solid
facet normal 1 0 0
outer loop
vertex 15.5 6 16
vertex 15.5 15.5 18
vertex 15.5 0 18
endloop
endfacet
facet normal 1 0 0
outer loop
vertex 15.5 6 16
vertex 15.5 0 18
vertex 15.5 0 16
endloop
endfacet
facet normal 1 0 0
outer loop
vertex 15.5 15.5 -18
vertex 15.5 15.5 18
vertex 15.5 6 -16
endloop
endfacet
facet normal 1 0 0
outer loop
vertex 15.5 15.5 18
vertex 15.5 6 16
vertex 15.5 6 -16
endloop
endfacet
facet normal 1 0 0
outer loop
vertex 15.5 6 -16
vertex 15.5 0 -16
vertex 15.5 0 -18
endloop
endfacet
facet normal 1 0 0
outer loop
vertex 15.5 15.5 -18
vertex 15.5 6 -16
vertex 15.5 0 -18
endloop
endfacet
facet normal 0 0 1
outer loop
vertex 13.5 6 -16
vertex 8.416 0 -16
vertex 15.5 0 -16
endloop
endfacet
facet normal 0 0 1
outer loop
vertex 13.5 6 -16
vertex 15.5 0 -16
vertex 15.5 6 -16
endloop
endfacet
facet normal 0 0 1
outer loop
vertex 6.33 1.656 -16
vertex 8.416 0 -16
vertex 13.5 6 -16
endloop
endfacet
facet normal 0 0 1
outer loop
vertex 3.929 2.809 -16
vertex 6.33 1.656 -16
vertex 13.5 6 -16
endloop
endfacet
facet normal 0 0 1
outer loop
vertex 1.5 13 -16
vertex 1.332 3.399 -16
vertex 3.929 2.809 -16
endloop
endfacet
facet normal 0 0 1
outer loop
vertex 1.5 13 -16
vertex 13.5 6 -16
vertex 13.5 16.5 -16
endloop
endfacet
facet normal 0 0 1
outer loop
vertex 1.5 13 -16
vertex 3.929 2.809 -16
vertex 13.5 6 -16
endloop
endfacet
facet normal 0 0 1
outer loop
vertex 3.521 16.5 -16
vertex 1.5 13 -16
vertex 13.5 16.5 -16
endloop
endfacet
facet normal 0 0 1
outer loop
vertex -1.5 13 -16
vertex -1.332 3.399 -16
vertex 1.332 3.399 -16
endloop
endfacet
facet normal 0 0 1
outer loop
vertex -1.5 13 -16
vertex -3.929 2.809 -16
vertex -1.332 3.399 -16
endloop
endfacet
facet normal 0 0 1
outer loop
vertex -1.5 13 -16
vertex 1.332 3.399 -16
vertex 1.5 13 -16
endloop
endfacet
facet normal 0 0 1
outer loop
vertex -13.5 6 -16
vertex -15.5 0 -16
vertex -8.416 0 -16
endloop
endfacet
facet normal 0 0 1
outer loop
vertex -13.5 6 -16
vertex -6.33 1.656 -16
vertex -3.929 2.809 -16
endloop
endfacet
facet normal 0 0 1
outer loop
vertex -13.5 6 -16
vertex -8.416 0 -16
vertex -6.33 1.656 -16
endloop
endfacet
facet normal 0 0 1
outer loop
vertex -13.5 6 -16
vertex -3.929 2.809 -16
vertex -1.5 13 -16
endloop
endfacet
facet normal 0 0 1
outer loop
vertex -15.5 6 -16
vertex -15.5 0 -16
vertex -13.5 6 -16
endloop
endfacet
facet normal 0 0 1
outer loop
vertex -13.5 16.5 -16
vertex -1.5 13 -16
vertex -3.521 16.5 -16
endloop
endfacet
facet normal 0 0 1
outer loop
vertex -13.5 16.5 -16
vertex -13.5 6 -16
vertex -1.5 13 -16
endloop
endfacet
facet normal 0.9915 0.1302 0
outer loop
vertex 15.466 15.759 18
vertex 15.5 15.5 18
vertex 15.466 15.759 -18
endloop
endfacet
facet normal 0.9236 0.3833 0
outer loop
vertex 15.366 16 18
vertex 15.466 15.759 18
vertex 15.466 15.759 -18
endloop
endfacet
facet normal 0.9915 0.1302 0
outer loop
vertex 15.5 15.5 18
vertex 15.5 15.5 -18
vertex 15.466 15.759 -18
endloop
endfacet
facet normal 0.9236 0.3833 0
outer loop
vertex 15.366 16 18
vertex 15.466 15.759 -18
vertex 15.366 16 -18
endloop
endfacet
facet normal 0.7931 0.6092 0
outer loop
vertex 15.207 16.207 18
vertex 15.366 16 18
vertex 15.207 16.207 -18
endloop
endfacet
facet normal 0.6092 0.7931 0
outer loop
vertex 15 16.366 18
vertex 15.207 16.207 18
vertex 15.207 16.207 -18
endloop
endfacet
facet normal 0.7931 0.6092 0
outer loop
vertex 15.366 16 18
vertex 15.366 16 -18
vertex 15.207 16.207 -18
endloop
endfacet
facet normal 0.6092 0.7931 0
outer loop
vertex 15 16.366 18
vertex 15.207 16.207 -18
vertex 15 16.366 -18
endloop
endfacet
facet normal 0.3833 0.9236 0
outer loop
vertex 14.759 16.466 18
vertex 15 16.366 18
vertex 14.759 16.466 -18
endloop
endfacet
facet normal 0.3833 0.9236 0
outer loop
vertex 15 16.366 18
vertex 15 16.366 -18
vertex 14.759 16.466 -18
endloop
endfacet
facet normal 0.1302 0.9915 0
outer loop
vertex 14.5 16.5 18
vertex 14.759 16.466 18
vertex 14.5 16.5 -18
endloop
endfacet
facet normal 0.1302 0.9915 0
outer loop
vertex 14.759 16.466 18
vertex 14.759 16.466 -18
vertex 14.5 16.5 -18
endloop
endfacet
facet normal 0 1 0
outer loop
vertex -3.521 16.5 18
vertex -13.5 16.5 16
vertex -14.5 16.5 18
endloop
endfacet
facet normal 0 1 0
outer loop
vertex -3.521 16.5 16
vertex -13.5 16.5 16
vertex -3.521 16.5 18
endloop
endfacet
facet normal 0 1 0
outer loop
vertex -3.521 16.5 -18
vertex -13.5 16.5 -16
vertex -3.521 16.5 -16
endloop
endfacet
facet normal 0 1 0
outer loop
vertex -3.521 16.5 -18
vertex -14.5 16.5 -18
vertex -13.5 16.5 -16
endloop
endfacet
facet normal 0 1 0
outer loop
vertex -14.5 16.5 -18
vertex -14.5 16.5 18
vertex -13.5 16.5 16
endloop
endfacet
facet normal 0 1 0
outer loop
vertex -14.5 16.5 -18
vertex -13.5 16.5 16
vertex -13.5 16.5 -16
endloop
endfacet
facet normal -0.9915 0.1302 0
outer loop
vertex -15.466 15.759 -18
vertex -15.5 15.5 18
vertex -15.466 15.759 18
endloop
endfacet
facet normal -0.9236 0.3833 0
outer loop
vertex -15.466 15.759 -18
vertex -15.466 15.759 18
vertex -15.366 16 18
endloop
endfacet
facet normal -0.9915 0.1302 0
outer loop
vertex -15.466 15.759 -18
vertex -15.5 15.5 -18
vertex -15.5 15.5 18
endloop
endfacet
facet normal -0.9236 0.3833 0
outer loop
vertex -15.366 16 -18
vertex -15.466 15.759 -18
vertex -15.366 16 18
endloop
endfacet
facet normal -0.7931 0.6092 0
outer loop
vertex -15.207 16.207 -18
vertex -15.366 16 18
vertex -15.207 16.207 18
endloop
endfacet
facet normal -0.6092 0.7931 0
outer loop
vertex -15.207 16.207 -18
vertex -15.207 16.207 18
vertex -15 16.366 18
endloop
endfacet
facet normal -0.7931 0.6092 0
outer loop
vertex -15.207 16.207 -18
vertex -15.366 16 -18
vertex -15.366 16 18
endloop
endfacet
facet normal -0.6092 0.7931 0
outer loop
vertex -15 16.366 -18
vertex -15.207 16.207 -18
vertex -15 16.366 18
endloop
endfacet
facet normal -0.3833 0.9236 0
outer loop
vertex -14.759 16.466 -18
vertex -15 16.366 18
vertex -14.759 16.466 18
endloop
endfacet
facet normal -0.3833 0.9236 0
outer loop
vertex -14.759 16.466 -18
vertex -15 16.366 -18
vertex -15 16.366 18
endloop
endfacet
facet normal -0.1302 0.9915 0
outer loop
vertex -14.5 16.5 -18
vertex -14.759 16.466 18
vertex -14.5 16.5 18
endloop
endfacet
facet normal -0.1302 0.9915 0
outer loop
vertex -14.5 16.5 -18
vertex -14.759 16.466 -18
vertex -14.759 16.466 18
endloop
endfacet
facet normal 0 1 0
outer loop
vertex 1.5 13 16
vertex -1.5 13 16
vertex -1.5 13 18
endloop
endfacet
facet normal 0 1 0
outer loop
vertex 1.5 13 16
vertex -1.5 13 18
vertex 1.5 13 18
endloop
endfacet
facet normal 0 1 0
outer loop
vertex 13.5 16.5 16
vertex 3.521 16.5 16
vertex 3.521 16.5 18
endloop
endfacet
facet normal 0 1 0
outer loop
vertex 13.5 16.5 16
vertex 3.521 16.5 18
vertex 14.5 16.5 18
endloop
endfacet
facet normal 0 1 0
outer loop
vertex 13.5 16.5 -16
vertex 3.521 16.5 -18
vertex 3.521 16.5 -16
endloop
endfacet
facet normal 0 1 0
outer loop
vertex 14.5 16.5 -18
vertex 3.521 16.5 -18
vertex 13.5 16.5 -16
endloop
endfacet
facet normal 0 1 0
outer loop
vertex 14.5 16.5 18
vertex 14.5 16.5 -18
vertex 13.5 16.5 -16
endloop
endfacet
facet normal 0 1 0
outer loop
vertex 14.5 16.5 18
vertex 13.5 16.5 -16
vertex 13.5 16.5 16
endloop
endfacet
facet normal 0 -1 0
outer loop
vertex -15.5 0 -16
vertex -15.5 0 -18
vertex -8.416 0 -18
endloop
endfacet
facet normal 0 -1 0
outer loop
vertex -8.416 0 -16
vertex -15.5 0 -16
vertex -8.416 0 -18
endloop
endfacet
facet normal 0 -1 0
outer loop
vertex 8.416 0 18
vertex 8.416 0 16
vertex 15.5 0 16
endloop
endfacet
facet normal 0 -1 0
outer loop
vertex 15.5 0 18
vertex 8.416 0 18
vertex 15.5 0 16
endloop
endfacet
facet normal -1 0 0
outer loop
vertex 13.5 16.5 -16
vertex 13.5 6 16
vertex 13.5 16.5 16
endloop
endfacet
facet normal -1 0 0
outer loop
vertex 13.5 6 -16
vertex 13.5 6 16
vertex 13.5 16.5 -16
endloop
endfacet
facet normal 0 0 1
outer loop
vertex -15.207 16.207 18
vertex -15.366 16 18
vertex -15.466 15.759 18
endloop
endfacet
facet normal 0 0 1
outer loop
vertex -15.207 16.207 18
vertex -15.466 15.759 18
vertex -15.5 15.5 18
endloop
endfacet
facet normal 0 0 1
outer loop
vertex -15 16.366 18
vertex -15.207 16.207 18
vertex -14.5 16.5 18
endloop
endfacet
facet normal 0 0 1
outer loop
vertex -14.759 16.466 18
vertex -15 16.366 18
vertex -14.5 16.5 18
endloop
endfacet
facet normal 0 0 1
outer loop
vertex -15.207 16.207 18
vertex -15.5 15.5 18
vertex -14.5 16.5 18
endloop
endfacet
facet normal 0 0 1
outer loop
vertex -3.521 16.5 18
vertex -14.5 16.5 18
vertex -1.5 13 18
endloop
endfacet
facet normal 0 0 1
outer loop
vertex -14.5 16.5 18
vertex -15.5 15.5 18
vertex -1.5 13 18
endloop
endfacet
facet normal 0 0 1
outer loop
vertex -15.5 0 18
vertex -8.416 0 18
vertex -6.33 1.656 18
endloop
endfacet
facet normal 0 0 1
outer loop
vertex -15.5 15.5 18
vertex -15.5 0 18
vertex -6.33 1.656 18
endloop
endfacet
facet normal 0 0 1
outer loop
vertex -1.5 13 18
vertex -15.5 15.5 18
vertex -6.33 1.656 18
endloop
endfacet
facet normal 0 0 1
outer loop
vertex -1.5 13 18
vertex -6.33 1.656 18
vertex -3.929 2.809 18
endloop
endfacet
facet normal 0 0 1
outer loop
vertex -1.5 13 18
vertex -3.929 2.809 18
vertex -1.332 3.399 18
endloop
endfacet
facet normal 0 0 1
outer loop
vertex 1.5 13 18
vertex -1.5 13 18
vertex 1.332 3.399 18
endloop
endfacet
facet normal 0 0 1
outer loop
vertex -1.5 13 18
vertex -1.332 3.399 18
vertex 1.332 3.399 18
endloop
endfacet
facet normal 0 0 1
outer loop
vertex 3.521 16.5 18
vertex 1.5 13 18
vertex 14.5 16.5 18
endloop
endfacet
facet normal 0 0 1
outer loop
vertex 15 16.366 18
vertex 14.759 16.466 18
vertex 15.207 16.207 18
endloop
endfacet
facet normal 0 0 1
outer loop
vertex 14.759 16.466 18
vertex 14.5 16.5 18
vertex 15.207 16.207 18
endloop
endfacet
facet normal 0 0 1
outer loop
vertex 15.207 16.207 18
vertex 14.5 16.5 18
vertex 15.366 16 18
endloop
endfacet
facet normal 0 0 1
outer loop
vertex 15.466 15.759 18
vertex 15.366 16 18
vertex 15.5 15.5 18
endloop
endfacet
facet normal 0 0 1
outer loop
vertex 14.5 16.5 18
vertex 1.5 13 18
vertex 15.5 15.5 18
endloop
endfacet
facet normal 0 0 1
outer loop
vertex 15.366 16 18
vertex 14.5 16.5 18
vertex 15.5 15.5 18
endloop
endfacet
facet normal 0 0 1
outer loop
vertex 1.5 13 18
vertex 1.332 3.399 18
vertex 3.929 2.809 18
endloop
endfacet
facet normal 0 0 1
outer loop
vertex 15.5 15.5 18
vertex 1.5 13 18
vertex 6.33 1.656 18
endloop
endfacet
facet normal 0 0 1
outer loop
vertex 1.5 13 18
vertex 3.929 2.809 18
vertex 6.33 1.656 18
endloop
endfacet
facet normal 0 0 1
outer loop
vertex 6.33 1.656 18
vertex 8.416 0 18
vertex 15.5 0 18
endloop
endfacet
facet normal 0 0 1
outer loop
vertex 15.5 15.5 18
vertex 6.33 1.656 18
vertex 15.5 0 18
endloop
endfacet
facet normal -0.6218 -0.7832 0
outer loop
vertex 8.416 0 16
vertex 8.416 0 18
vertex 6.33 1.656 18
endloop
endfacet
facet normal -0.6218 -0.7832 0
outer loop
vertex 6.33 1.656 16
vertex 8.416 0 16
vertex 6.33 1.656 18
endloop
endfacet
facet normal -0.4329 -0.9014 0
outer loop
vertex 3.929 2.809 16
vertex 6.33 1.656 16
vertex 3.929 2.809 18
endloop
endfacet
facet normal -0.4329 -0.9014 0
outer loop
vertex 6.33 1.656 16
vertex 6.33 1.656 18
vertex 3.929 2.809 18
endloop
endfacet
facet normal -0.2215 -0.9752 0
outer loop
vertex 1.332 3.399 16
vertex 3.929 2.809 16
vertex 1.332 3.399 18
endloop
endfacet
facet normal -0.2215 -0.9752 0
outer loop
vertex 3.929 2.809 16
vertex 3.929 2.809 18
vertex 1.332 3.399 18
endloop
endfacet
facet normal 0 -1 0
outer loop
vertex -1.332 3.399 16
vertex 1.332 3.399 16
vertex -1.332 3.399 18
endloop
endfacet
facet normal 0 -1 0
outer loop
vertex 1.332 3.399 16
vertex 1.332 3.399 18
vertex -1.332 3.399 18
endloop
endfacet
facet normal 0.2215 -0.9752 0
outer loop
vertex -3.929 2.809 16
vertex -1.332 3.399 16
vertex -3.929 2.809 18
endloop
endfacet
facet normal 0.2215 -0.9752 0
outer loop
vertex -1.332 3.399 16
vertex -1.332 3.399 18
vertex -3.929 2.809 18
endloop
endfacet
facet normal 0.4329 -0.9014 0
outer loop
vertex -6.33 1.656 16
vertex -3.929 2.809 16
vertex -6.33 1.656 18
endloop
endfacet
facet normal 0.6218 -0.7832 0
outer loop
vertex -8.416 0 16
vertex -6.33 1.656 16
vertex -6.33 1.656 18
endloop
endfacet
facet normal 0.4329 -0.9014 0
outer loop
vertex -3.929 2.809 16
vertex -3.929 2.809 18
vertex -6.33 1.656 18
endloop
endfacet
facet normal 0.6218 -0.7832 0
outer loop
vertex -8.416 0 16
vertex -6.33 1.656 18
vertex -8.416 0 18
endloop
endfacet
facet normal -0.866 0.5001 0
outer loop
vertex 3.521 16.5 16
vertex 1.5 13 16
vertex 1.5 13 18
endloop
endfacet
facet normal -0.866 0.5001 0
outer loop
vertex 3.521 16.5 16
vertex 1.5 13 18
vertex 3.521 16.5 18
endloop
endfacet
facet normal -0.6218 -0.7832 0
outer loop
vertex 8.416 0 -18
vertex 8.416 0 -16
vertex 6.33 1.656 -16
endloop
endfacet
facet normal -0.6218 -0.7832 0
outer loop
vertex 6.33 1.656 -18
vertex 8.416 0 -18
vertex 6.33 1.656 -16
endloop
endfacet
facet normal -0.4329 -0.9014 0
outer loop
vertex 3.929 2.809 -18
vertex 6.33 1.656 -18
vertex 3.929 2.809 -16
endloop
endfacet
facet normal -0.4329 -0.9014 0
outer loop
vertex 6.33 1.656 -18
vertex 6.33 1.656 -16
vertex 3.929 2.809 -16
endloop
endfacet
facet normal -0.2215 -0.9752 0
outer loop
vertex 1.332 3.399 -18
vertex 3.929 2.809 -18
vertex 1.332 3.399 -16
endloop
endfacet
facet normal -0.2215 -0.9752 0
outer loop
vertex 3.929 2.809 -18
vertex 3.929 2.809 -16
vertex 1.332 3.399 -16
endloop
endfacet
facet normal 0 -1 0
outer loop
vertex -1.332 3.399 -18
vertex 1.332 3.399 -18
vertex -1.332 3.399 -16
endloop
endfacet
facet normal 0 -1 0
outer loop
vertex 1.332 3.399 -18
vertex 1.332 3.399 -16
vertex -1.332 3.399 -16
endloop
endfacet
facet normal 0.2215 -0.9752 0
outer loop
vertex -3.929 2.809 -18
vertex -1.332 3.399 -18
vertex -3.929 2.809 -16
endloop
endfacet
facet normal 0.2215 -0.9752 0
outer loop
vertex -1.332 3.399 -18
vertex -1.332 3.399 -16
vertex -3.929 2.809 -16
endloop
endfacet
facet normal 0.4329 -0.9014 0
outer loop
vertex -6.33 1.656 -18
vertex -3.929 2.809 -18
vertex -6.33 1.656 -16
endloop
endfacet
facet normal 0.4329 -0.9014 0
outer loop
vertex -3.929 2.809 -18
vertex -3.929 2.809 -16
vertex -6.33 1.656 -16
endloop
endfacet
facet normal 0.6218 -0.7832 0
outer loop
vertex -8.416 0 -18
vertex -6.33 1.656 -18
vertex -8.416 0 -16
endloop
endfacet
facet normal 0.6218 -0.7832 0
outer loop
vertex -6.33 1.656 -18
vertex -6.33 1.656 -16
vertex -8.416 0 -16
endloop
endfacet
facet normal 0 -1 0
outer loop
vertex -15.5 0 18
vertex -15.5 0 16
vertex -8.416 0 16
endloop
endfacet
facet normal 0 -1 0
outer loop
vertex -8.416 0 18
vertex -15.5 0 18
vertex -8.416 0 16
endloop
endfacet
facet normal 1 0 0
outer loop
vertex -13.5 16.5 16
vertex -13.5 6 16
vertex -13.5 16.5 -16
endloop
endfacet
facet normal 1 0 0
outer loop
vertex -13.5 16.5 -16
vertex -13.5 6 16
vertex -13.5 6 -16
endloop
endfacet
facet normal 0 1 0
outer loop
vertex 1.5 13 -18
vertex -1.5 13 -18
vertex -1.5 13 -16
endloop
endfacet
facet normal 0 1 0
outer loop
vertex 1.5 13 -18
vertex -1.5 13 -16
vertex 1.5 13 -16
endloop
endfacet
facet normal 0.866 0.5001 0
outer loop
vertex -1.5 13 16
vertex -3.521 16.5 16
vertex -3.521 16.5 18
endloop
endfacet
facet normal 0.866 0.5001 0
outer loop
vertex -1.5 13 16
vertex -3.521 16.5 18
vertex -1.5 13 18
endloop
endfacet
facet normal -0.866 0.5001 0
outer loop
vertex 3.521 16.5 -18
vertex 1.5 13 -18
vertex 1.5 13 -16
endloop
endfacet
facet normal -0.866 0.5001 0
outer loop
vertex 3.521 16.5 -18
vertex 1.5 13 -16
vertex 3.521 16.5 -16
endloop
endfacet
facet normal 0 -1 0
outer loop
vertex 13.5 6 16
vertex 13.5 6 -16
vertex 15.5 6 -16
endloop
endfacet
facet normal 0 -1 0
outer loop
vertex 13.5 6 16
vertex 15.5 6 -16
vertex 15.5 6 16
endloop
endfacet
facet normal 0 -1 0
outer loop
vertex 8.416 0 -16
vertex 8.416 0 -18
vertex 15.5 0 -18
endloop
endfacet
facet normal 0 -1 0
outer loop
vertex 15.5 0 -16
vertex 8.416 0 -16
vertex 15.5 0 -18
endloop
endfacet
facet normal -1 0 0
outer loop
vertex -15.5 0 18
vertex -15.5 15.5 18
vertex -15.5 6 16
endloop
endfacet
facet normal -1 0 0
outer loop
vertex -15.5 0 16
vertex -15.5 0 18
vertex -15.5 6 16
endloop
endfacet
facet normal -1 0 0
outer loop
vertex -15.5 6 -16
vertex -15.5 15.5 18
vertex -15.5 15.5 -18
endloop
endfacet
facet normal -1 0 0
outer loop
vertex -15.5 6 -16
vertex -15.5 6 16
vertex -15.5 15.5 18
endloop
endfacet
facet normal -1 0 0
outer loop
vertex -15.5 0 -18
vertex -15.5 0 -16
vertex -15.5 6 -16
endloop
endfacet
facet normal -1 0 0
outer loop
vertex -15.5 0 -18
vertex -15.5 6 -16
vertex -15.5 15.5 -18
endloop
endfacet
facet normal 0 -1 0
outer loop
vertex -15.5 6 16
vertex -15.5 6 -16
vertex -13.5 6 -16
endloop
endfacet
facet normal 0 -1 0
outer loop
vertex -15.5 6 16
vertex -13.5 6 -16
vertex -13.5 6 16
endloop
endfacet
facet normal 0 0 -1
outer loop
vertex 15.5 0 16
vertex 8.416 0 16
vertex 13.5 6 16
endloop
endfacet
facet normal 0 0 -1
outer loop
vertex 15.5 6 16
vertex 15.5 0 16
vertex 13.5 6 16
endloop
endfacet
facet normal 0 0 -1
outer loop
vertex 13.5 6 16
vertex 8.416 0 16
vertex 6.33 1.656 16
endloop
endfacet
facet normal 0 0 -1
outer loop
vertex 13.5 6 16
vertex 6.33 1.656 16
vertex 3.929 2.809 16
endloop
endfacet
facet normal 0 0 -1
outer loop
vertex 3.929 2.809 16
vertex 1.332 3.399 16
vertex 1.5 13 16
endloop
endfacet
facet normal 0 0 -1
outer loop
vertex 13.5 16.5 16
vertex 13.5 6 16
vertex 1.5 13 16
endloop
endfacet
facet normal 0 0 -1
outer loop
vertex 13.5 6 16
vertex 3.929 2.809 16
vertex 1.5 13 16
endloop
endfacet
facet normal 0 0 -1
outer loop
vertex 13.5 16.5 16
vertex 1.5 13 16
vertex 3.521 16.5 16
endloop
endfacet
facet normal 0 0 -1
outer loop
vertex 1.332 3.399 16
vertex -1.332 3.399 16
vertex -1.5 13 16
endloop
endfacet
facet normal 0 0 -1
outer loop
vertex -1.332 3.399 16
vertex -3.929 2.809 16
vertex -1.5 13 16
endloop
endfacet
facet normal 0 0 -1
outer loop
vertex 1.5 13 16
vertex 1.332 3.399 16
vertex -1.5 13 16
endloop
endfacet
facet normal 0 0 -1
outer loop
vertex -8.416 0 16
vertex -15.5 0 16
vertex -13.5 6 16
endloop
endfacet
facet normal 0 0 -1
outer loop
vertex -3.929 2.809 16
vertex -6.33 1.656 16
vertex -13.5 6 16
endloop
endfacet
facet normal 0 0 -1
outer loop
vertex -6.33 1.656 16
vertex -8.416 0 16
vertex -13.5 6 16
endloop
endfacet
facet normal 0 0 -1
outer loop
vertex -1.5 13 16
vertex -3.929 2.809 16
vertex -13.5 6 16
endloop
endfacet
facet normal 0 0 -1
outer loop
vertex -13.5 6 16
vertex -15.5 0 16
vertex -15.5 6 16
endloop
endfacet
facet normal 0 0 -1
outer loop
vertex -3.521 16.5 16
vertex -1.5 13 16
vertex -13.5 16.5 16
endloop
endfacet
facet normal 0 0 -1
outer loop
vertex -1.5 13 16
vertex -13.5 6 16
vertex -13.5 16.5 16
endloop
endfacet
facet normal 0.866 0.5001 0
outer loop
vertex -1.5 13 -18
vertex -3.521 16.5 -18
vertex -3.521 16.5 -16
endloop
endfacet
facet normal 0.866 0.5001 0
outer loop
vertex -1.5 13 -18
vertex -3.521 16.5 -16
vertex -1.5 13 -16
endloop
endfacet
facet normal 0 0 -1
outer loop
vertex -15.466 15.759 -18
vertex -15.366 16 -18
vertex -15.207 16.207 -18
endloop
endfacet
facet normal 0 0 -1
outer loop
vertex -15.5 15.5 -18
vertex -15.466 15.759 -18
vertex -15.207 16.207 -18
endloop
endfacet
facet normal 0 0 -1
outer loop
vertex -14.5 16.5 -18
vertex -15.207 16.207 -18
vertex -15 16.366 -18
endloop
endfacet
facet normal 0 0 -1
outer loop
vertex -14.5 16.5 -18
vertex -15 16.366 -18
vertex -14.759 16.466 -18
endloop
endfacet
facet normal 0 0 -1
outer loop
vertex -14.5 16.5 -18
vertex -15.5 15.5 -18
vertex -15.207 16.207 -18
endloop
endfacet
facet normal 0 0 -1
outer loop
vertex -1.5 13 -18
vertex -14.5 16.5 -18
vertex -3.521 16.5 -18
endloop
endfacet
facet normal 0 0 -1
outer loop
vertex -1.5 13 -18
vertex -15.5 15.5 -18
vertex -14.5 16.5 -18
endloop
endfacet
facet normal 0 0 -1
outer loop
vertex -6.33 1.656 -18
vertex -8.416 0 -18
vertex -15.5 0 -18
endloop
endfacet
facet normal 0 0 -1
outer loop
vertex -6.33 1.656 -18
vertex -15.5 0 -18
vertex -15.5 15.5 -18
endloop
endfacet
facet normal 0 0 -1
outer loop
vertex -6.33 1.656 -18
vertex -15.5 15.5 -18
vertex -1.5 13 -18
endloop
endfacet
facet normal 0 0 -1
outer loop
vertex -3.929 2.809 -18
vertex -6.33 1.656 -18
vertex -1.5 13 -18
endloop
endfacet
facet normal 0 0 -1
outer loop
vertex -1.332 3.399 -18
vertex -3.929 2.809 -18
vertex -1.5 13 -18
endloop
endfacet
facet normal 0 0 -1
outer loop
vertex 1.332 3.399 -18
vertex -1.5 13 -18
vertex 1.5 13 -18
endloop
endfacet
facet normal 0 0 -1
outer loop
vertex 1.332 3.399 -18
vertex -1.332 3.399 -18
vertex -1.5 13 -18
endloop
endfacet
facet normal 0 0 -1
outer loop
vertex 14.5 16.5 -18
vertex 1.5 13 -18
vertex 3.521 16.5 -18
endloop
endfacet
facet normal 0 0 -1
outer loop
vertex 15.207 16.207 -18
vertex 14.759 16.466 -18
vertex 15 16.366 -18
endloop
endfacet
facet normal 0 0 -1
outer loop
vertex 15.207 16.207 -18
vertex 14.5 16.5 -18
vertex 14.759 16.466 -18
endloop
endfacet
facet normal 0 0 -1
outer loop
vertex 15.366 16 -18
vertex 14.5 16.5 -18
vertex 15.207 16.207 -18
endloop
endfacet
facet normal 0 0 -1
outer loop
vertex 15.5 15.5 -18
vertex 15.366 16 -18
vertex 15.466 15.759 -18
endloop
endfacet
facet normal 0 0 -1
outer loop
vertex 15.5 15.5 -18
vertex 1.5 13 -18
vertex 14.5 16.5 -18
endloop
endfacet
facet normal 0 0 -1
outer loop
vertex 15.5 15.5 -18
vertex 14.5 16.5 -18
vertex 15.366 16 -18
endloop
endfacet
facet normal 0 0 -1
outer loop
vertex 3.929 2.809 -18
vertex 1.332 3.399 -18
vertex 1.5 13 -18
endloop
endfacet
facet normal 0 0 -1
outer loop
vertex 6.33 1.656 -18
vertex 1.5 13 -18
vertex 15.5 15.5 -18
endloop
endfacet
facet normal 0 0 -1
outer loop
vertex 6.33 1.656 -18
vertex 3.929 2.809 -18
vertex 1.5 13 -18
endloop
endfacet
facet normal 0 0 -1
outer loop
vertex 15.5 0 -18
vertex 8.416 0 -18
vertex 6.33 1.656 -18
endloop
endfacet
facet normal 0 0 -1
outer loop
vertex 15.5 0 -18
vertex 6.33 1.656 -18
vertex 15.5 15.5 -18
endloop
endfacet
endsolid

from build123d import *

# Parameters (mm, degrees)
SKETCH1_W               = 31
SKETCH1_H               = 36
SKETCH1_W_2             = 27
SKETCH1_H_2             = 32
EXTRUDE1_DEPTH          = 16.5
SKETCH2_W               = 32
SKETCH2_H               = 6
CUT_EXTRUDE1_DEPTH      = 40.462007045
CUT_EXTRUDE2_DEPTH      = 43.52646235
FILLET1_R               = 1
CUT_EXTRUDE4_DEPTH      = 43.52646235
CUT_EXTRUDE4_DEPTH_BACK = 43.52646235


with BuildPart() as part:
    # Sketch1 → Extrude1 (new body)
    with BuildSketch(Plane(origin=(0, 0, 0), x_dir=(1, 0, 0), z_dir=(0, 1, 0))):
        Rectangle(SKETCH1_W, SKETCH1_H)
        Rectangle(SKETCH1_W_2, SKETCH1_H_2, mode=Mode.SUBTRACT)
    extrude(amount=EXTRUDE1_DEPTH)

    # Sketch2 → Cut-Extrude1 (cut, through all)
    with BuildSketch(Plane.ZY.offset(15.5)):
        with Locations((0, 3)):
            Rectangle(SKETCH2_W, SKETCH2_H)
    extrude(amount=-CUT_EXTRUDE1_DEPTH, mode=Mode.SUBTRACT)

    # Sketch3 → Cut-Extrude2 (cut, through all)
    with BuildSketch(Plane(origin=(0, 0, -18), x_dir=(-1, 0, 0), z_dir=(0, 0, -1))):
        Polygon((-3.520725942, 16.5), (3.520725942, 16.5), (1.5, 13), (-1.5, 13), align=None)
    extrude(amount=-CUT_EXTRUDE2_DEPTH, mode=Mode.SUBTRACT)

    # Fillet1
    fillet1_edges = [part.edges().sort_by_distance(p)[0] for p in [
        (15.5, 16.5, 0),
        (-15.5, 16.5, 0),
    ]]
    fillet(fillet1_edges, radius=FILLET1_R)

    # Sketch4 → Cut-Extrude4 (cut, two sides: drawn at the far end of the back side and taken through both)
    with BuildSketch(Plane(origin=(0, 0, -18), x_dir=(-1, 0, 0), z_dir=(0, 0, -1)).offset(-CUT_EXTRUDE4_DEPTH_BACK)):
        with BuildLine():
            Line((-56.695317872, -48.043906057), (-8.415960011, 0))
            ThreePointArc((-8.415960011, 0), (0, 3.47396015), (8.415960011, 0))
            Line((8.415960011, 0), (56.695317872, -48.043906057))
            Line((56.695317872, -48.043906057), (56.695317872, -184.265979228))
            Line((56.695317872, -184.265979228), (-56.695317872, -184.265979228))
            Line((-56.695317872, -184.265979228), (-56.695317872, -48.043906057))
        make_face()
    extrude(amount=CUT_EXTRUDE4_DEPTH + CUT_EXTRUDE4_DEPTH_BACK, mode=Mode.SUBTRACT)


solid = part.part
